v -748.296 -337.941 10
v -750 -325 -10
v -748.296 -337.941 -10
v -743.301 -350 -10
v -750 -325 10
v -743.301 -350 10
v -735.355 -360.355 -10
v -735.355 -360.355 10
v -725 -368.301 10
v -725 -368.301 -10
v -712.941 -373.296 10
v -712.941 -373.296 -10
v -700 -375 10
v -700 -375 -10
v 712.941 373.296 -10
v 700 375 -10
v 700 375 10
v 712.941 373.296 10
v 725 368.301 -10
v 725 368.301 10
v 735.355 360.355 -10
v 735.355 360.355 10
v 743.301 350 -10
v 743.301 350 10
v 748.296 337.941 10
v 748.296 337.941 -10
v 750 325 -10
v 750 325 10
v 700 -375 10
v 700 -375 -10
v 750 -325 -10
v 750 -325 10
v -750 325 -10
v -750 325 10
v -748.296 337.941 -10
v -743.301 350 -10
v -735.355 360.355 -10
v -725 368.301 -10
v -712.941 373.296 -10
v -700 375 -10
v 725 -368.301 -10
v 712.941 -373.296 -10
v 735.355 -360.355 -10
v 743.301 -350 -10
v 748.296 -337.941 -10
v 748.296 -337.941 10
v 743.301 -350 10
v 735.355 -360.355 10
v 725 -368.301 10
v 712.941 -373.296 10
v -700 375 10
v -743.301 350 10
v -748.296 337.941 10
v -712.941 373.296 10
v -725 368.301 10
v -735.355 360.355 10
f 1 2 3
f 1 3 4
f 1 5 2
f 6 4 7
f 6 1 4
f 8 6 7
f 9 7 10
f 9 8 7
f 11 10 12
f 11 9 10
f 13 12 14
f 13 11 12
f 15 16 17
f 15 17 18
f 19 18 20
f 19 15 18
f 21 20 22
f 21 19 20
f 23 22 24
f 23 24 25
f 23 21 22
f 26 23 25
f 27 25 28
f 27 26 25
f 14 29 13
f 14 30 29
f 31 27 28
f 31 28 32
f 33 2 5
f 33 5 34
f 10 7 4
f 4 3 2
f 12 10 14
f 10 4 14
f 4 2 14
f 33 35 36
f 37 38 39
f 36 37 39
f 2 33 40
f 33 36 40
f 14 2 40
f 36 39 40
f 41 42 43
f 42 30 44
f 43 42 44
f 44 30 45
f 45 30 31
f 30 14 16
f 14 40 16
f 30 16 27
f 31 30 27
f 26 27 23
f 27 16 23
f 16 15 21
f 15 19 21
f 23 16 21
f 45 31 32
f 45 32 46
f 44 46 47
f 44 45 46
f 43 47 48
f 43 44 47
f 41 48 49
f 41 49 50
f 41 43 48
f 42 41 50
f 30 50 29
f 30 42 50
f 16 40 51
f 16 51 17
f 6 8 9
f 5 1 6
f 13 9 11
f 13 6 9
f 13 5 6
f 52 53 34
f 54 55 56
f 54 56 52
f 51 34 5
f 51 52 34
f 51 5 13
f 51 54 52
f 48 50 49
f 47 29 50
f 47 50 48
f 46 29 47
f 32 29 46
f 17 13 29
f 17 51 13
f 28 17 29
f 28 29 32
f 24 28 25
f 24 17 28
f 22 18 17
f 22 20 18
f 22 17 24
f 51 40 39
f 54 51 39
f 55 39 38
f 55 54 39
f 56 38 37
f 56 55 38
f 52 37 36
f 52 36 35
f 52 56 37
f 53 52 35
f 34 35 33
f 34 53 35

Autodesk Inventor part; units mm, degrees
sketch "Sketch1" plane through (0, 0, 0) normal (0, 0, 1) x (1, 0, 0)
  line L0 (-750, 375) -> (750, 375)
  line L1 (750, 375) -> (750, -375)
  line L2 (750, -375) -> (-750, -375)
  line L3 (-750, -375) -> (-750, 375)
  line L4 (-750, 375) -> (750, -375) construction
  line L5 (750, 375) -> (-750, -375) construction
  point P0 (0, 0)
  dimension "d0" = 1500
  dimension "d1" = 750
extrude "Extrusion1" add sketch "Sketch1" along normal mid plane 20
fillet "Fillet1" radius 50 4 edges at (-750, 375, 0) (750, 375, 0) (750, -375, 0) (-750, -375, 0)
equation "\"BendRadius\" = Thickness"
equation "\"BendReliefWidth\" = Thickness"
equation "\"BendReliefDepth\" = 0.5 * Thickness"
equation "\"CornerReliefSize\" = 4 * Thickness"
equation "\"MinimumRemnant\" = 2 * Thickness"
equation "\"TransitionRadius\" = BendRadius"
equation "\"JacobiRadiusSize\" = BendRadius"
equation "\"GapSize\" = Thickness"
equation "\"Thickness\" = 3.048"
properties part number "Sessao_28_03_001_001" material "Steel, Galvanized"
